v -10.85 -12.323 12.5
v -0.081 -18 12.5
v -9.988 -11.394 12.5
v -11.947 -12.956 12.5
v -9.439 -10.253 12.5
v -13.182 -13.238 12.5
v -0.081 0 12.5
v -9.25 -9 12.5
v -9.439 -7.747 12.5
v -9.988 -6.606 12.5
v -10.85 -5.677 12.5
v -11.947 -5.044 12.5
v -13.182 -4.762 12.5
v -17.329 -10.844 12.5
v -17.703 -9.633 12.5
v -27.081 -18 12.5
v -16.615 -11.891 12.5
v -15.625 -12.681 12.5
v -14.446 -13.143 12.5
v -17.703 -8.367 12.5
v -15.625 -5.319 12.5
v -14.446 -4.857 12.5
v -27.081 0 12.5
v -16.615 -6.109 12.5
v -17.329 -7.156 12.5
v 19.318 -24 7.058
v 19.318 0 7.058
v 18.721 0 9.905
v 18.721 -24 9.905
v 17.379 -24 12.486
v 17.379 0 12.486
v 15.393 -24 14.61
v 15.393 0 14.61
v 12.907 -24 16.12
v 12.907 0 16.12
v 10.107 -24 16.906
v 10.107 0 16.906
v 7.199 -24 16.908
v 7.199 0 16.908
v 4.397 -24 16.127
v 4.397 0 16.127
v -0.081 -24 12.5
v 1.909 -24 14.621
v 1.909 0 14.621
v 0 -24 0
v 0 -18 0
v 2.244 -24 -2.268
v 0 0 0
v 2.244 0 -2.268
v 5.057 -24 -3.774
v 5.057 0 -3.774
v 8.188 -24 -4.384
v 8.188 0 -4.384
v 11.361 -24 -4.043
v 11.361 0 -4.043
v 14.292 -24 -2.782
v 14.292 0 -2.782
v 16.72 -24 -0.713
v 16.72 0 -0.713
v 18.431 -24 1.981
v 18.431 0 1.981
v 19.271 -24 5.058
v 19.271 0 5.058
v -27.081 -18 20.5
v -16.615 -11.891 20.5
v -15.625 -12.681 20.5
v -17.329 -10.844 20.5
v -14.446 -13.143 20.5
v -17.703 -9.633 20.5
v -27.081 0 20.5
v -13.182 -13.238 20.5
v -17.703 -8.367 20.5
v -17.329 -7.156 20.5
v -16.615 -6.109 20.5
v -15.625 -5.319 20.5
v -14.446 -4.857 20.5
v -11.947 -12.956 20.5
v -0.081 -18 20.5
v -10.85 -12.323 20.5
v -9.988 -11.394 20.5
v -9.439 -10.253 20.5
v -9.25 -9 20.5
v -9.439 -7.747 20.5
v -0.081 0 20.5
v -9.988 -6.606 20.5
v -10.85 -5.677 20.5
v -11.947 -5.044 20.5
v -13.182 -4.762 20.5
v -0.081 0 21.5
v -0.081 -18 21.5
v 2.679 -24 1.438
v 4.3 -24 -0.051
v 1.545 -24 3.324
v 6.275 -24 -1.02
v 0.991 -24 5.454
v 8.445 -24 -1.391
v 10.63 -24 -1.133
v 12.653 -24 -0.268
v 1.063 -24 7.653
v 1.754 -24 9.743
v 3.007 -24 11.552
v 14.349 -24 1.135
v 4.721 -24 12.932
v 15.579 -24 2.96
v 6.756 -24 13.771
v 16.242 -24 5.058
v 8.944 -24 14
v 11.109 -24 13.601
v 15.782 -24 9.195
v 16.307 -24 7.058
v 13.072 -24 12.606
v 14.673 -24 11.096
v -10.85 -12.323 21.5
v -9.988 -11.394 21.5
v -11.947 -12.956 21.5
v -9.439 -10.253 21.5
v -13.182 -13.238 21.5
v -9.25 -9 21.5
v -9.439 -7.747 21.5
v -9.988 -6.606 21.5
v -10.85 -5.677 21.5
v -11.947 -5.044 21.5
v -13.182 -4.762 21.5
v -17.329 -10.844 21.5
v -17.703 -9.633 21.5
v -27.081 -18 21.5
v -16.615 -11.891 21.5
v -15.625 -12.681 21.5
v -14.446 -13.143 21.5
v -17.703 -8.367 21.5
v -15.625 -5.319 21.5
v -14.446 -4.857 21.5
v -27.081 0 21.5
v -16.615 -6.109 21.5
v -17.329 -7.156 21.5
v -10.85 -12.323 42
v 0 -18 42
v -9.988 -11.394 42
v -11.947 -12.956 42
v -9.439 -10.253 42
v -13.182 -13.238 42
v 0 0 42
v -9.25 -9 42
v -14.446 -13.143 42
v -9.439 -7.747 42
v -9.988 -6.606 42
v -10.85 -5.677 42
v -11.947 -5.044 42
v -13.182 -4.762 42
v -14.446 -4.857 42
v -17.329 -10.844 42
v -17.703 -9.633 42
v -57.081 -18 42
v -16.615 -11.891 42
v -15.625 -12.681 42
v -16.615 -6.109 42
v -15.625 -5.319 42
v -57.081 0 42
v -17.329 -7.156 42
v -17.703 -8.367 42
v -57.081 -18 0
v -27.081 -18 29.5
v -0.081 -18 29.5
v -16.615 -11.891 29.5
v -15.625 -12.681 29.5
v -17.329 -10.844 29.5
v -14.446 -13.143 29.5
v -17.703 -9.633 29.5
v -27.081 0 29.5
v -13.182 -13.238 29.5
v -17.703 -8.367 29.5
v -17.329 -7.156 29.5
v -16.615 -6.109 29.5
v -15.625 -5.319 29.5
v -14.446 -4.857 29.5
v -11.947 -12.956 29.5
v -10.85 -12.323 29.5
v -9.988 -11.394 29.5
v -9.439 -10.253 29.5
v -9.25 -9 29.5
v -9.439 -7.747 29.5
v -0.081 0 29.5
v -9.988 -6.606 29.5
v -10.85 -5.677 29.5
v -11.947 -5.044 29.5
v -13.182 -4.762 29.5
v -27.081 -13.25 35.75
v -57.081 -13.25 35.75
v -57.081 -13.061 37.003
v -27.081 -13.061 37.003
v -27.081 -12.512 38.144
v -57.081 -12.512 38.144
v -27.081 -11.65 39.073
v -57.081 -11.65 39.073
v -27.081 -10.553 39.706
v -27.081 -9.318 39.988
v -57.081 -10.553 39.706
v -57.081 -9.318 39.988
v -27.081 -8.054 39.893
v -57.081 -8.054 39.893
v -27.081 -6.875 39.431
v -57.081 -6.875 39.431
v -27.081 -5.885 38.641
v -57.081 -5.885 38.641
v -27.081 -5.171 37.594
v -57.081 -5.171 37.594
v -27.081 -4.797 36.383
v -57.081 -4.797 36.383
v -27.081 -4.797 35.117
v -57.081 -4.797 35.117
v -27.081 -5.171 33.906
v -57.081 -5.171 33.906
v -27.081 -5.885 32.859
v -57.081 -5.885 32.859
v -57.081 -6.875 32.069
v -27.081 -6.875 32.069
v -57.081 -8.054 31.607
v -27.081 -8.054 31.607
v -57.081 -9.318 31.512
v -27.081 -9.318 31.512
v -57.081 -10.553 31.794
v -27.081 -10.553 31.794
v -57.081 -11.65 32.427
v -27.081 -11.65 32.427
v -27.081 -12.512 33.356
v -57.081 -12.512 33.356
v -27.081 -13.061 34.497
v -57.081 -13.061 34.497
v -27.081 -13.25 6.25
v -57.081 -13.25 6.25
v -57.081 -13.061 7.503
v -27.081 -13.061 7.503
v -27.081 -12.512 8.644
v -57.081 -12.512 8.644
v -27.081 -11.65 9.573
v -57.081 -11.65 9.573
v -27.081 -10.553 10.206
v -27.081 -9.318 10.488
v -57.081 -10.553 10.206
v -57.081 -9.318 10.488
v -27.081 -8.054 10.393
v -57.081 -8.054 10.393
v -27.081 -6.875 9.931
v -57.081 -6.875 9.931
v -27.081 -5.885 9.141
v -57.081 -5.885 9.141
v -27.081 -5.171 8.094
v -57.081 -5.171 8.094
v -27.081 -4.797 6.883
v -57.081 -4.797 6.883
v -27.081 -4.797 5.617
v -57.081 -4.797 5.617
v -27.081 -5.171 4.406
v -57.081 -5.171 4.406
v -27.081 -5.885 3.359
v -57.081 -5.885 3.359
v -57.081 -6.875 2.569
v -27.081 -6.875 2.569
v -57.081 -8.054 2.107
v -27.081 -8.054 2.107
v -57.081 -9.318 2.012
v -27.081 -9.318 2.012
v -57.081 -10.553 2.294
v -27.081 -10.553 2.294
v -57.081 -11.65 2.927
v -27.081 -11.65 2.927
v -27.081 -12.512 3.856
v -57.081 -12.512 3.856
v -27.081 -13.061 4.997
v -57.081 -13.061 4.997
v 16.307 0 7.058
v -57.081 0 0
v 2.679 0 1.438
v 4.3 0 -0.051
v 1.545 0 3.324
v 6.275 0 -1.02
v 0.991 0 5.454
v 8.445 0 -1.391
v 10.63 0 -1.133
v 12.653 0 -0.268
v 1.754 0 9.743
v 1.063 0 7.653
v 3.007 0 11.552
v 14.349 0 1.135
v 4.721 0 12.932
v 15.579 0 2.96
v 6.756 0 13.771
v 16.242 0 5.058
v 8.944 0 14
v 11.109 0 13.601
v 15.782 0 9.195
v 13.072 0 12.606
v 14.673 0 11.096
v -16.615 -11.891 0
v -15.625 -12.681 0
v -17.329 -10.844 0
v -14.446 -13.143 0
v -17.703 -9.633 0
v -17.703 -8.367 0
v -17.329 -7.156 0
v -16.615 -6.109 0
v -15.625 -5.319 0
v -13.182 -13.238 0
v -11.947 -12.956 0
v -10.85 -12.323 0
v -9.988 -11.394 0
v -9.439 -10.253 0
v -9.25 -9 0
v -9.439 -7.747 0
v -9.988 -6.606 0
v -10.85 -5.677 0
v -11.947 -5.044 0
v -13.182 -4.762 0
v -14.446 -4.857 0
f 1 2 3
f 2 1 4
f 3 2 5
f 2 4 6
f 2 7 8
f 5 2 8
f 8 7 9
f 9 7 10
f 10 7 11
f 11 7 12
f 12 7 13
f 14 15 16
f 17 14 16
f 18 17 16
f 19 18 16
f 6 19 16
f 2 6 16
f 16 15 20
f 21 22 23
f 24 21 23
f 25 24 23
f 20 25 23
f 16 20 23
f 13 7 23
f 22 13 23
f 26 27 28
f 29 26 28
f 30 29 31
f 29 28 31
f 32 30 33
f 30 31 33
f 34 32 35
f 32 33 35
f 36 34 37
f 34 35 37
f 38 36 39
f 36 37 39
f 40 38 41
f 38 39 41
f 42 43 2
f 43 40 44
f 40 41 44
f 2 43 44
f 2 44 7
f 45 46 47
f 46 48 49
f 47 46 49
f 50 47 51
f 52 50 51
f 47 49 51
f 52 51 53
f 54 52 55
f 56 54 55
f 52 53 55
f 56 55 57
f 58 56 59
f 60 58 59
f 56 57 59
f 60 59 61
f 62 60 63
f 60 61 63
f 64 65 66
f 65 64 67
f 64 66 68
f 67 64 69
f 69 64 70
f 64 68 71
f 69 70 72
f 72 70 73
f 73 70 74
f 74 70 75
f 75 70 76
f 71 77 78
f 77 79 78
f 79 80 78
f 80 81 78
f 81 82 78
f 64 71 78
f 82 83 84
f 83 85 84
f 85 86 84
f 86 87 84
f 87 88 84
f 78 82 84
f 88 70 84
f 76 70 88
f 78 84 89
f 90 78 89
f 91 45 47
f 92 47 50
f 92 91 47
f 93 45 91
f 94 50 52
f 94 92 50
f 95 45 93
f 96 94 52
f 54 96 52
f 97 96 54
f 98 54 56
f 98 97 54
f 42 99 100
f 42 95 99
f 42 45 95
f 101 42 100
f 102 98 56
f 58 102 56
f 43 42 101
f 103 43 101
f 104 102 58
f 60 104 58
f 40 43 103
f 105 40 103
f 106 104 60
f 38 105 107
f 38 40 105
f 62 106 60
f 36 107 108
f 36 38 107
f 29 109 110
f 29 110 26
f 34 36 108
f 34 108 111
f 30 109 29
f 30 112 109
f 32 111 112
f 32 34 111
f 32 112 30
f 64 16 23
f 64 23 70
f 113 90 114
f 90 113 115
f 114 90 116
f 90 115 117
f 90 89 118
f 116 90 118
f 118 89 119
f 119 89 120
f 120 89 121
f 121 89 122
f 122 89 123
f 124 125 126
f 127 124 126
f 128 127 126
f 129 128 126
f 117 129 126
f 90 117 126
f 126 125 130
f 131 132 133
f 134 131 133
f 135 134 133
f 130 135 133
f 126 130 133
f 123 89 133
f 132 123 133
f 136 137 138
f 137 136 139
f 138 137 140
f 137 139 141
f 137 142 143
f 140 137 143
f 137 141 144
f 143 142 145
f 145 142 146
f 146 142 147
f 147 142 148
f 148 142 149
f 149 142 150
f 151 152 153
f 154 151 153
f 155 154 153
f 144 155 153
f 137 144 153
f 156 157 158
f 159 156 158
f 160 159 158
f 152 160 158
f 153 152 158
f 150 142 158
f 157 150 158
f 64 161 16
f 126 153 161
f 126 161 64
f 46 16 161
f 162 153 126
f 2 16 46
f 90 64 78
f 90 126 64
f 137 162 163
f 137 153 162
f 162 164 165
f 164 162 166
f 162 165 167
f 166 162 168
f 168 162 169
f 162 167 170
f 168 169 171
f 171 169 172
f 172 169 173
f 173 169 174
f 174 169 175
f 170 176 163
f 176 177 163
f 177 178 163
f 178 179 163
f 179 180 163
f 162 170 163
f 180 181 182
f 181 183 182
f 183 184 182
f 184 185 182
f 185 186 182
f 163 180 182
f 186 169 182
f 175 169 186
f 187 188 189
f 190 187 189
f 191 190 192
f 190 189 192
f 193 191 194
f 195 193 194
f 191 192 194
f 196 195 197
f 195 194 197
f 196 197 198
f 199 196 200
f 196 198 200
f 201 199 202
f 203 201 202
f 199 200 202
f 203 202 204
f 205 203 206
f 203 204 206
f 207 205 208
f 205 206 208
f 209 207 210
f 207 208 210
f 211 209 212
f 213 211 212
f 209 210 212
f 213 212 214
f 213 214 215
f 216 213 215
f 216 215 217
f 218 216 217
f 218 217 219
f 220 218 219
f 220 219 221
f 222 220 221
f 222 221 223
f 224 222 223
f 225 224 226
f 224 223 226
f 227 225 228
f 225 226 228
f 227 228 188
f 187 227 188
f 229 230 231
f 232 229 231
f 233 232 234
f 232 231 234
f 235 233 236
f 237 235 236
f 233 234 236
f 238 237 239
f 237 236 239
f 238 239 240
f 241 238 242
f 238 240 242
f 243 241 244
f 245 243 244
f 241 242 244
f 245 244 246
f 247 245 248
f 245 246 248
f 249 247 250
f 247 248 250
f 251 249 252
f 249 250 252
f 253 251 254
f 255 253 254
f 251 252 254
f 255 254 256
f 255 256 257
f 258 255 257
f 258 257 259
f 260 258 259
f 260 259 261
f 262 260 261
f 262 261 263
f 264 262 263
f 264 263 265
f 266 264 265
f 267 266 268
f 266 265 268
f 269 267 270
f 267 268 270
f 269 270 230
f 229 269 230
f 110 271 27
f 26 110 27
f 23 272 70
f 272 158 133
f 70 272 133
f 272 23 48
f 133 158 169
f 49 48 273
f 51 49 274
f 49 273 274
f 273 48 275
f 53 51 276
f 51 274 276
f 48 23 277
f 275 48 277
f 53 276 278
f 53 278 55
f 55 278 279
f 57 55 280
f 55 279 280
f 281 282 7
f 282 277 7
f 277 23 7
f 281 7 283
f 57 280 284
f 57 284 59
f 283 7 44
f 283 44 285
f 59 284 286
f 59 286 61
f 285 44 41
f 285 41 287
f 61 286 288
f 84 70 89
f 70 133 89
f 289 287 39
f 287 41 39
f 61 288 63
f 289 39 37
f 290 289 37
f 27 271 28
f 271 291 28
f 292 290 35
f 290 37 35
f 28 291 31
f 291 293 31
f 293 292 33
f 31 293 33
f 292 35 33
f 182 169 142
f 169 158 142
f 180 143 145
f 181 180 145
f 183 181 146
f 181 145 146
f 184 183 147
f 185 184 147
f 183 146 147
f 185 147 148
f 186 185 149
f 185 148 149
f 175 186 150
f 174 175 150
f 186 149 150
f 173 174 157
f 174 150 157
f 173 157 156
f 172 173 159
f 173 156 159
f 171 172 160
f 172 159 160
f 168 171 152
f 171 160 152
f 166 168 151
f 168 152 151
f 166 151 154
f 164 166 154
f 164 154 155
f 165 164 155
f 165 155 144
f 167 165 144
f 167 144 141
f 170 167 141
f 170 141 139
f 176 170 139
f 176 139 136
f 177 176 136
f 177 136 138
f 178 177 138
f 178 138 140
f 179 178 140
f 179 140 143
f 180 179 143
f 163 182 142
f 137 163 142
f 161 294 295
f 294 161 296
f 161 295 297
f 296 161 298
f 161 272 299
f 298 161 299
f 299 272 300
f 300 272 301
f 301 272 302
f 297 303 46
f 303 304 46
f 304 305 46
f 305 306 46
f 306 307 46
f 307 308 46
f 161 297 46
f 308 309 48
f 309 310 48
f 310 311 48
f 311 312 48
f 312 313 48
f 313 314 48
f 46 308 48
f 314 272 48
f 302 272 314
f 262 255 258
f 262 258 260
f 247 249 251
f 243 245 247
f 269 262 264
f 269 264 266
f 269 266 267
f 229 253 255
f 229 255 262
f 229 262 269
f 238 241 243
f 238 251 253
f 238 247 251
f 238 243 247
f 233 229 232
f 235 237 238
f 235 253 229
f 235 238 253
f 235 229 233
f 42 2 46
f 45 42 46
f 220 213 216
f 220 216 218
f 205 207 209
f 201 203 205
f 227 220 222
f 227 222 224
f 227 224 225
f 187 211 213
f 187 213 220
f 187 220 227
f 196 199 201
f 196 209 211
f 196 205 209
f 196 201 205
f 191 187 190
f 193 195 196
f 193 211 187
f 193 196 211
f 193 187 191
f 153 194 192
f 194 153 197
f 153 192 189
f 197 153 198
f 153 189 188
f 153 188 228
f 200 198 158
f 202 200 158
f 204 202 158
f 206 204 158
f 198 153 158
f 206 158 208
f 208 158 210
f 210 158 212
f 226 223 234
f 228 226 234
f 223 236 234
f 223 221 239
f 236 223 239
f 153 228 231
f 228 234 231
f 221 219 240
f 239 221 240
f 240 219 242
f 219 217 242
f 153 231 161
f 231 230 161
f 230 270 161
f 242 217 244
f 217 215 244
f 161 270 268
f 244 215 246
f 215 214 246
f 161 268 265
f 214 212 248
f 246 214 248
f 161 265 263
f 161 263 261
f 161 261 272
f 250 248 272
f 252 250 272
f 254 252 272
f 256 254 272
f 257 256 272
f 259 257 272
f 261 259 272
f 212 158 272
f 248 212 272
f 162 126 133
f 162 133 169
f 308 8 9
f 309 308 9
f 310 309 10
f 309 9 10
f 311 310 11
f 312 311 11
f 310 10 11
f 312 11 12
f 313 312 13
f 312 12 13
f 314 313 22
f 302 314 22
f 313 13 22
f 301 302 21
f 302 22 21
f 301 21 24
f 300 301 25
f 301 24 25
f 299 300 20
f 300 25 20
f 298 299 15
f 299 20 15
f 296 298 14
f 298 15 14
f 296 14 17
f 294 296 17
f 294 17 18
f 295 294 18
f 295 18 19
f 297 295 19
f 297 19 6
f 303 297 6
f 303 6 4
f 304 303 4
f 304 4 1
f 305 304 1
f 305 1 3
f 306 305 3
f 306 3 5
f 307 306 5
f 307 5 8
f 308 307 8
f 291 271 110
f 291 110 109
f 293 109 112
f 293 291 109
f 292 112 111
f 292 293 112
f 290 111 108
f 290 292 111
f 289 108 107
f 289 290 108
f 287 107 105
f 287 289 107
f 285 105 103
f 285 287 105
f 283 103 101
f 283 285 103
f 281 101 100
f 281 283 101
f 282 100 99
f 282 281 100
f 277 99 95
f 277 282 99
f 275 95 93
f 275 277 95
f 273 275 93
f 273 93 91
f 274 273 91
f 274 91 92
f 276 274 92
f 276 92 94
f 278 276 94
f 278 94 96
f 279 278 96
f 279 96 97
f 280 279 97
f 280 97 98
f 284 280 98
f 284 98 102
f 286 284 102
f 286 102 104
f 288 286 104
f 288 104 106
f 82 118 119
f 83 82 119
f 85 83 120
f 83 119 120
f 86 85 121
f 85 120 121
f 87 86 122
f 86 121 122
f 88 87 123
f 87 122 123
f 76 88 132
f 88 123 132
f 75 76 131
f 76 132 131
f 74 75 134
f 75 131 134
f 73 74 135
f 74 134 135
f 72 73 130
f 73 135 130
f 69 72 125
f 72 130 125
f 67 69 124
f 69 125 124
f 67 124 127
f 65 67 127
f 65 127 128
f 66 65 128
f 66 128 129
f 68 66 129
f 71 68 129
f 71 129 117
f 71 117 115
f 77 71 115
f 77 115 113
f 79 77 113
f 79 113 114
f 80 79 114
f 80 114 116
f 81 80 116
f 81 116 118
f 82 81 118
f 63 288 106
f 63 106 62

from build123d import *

# Parameters (mm, degrees)
F3_DEPTH  = 18
F4_R      = 4.25
F5_DEPTH  = 30
F6_R      = 4.25
F7_DEPTH  = 100
F2_R      = 7.7
F8_DEPTH  = 24
F9_W      = 8
F9_H      = 2
F10_DEPTH = 40


with BuildPart() as f3:
    # F2 (on Front) → F3 (new body)
    with BuildSketch(Plane.XZ):
        with BuildLine():
            Line((-57.0810220509, 0), (0, 0))
            ThreePointArc((0, 0), (-2.0556624872, 6.2369382637), (-0.0810220509, 12.5))
            Line((-0.0810220509, 12.5), (-27.0810220509, 12.5))
            Line((-27.0810220509, 12.5), (-27.0810220509, 20.5))
            Line((-27.0810220509, 20.5), (-27.0810220509, 21))
            Line((-27.0810220509, 21), (-27.0810220509, 21.5))
            Line((-27.0810220509, 21.5), (-27.0810220509, 29.5))
            Line((-27.0810220509, 29.5), (-0.0810220509, 29.5))
            Line((-0.0810220509, 29.5), (0, 42))
            Line((0, 42), (-57.0810220509, 42))
            Line((-57.0810220509, 42), (-57.0810220509, 0))
        make_face()
        with BuildLine():
            ThreePointArc((-0.0810220509, 12.5), (-2.0556624872, 6.2369382637), (0, 0))
            Line((0, 0), (-0.0810220509, 12.5))
        make_face()
        Polygon((-27.0810220509, 21), (-27.0810220509, 20.5), (-0.0810220509, 20.5), (-0.0810220509, 21.5), (-27.0810220509, 21.5), align=None)
    extrude(amount=F3_DEPTH)

    # F4 (on face) → F5 (cut)
    with BuildSketch(Plane(origin=(-57.0810220509, 0, 0), x_dir=(0, -1, 0), z_dir=(-1, 0, 0))):
        with Locations((9, 6.25)):
            Circle(F4_R)
        with Locations((9, 35.75)):
            Circle(F4_R)
    extrude(amount=-F5_DEPTH, mode=Mode.SUBTRACT)

    # F6 (on face) → F7 (cut)
    with BuildSketch(Plane.XY.offset(42)):
        with Locations((-13.5, -9)):
            Circle(F6_R)
    extrude(amount=-F7_DEPTH, mode=Mode.SUBTRACT)

    # F2 (on Front) → F8 (join)
    with BuildSketch(Plane.XZ):
        with BuildLine():
            Line((-0.0810220509, 12.5), (0, 0))
            ThreePointArc((0, 0), (11.9605862967, -3.8667611144), (19.344112749, 6.3062916824))
            ThreePointArc((19.344112749, 6.3062916824), (11.894578688, 16.5006269319), (-0.0810220509, 12.5))
        make_face()
        with Locations((8.644112749, 6.3062916824)):
            Circle(F2_R, mode=Mode.SUBTRACT)
    extrude(amount=F8_DEPTH)

    # F9 (on Front) → F10 (cut)
    with BuildSketch(Plane.XZ):
        with Locations((17.9096895307, 6.058463525)):
            Rectangle(F9_W, F9_H)
    extrude(amount=F10_DEPTH, mode=Mode.SUBTRACT)


solid = f3.part
